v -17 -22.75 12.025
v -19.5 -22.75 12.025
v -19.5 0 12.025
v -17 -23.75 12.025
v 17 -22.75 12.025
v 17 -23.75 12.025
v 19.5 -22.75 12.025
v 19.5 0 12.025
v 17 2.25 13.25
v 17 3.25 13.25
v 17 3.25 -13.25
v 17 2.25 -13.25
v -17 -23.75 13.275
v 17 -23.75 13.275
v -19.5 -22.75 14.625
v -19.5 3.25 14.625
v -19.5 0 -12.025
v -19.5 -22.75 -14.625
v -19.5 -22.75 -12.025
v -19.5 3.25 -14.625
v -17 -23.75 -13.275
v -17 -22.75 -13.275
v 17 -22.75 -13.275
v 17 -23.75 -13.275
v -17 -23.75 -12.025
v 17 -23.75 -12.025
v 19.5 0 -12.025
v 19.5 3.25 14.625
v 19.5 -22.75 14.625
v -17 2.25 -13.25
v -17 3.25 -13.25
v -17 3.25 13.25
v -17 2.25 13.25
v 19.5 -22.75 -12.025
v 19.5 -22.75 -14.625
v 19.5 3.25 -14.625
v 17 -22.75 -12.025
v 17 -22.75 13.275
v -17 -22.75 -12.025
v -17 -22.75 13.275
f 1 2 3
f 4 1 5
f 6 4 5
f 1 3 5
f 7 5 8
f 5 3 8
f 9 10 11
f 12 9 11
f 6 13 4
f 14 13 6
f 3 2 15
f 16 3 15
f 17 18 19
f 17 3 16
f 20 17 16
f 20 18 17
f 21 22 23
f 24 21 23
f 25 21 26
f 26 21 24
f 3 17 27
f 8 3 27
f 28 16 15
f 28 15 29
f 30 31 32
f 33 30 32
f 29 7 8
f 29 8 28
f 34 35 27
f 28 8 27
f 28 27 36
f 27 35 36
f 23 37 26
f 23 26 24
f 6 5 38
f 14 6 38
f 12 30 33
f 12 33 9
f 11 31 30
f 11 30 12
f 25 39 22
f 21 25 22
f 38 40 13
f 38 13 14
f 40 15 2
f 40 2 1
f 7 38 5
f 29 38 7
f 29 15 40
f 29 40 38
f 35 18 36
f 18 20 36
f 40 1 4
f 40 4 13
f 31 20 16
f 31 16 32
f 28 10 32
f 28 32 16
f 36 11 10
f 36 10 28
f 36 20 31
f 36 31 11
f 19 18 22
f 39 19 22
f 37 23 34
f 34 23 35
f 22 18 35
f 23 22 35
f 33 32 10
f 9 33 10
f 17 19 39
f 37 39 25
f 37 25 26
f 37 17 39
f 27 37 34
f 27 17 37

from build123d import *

# Parameters (mm, degrees)
SKETCH1_W           = 39
SKETCH1_H           = 29.25
BOSS_EXTRUDE1_DEPTH = 3.25
SKETCH2_W           = 34
SKETCH2_H           = 24
CUT_EXTRUDE1_DEPTH  = 1
SKETCH3_W           = 34
SKETCH3_H           = 1.25
CUT_EXTRUDE2_DEPTH  = 1
SKETCH4_W           = 39
SKETCH4_H           = 22.75
BOSS_EXTRUDE2_DEPTH = 2.6
SKETCH6_W           = 34
SKETCH6_H           = 1.25
BOSS_EXTRUDE3_DEPTH = 1


with BuildPart() as part:
    # Sketch1 → Boss-Extrude1 (new body)
    with BuildSketch(Plane(origin=(0, 0, 0), x_dir=(1, 0, 0), z_dir=(0, 1, 0))):
        Rectangle(SKETCH1_W, SKETCH1_H)
    extrude(amount=BOSS_EXTRUDE1_DEPTH)

    # Sketch2 → Cut-Extrude1 (cut)
    with BuildSketch(Plane(origin=(0, 3.25, 0), x_dir=(1, 0, 0), z_dir=(0, 1, 0))):
        Rectangle(SKETCH2_W, SKETCH2_H)
    extrude(amount=-CUT_EXTRUDE1_DEPTH, mode=Mode.SUBTRACT)

    # Sketch3 → Cut-Extrude2 (cut)
    with BuildSketch(Plane(origin=(0, 3.25, 0), x_dir=(1, 0, 0), z_dir=(0, 1, 0))):
        with Locations((0, -12.625)):
            Rectangle(SKETCH3_W, SKETCH3_H)
    cut_extrude2 = extrude(amount=-CUT_EXTRUDE2_DEPTH, mode=Mode.SUBTRACT)

    # Mirror1: Cut-Extrude2 across plane
    add(cut_extrude2.mirror(Plane.XY), mode=Mode.SUBTRACT)

    # Sketch4 → Boss-Extrude2 (add)
    with BuildSketch(Plane.XY.offset(14.625)):
        with Locations((0, -11.375)):
            Rectangle(SKETCH4_W, SKETCH4_H)
    boss_extrude2 = extrude(amount=-BOSS_EXTRUDE2_DEPTH)

    # Sketch6 → Boss-Extrude3 (add)
    with BuildSketch(Plane.XZ.offset(22.75)):
        with Locations((0, 12.65)):
            Rectangle(SKETCH6_W, SKETCH6_H)
    boss_extrude3 = extrude(amount=BOSS_EXTRUDE3_DEPTH)

    # Mirror2: Boss-Extrude2, Boss-Extrude3 across plane
    add(boss_extrude2.mirror(Plane.XY))
    add(boss_extrude3.mirror(Plane.XY))


solid = part.part
